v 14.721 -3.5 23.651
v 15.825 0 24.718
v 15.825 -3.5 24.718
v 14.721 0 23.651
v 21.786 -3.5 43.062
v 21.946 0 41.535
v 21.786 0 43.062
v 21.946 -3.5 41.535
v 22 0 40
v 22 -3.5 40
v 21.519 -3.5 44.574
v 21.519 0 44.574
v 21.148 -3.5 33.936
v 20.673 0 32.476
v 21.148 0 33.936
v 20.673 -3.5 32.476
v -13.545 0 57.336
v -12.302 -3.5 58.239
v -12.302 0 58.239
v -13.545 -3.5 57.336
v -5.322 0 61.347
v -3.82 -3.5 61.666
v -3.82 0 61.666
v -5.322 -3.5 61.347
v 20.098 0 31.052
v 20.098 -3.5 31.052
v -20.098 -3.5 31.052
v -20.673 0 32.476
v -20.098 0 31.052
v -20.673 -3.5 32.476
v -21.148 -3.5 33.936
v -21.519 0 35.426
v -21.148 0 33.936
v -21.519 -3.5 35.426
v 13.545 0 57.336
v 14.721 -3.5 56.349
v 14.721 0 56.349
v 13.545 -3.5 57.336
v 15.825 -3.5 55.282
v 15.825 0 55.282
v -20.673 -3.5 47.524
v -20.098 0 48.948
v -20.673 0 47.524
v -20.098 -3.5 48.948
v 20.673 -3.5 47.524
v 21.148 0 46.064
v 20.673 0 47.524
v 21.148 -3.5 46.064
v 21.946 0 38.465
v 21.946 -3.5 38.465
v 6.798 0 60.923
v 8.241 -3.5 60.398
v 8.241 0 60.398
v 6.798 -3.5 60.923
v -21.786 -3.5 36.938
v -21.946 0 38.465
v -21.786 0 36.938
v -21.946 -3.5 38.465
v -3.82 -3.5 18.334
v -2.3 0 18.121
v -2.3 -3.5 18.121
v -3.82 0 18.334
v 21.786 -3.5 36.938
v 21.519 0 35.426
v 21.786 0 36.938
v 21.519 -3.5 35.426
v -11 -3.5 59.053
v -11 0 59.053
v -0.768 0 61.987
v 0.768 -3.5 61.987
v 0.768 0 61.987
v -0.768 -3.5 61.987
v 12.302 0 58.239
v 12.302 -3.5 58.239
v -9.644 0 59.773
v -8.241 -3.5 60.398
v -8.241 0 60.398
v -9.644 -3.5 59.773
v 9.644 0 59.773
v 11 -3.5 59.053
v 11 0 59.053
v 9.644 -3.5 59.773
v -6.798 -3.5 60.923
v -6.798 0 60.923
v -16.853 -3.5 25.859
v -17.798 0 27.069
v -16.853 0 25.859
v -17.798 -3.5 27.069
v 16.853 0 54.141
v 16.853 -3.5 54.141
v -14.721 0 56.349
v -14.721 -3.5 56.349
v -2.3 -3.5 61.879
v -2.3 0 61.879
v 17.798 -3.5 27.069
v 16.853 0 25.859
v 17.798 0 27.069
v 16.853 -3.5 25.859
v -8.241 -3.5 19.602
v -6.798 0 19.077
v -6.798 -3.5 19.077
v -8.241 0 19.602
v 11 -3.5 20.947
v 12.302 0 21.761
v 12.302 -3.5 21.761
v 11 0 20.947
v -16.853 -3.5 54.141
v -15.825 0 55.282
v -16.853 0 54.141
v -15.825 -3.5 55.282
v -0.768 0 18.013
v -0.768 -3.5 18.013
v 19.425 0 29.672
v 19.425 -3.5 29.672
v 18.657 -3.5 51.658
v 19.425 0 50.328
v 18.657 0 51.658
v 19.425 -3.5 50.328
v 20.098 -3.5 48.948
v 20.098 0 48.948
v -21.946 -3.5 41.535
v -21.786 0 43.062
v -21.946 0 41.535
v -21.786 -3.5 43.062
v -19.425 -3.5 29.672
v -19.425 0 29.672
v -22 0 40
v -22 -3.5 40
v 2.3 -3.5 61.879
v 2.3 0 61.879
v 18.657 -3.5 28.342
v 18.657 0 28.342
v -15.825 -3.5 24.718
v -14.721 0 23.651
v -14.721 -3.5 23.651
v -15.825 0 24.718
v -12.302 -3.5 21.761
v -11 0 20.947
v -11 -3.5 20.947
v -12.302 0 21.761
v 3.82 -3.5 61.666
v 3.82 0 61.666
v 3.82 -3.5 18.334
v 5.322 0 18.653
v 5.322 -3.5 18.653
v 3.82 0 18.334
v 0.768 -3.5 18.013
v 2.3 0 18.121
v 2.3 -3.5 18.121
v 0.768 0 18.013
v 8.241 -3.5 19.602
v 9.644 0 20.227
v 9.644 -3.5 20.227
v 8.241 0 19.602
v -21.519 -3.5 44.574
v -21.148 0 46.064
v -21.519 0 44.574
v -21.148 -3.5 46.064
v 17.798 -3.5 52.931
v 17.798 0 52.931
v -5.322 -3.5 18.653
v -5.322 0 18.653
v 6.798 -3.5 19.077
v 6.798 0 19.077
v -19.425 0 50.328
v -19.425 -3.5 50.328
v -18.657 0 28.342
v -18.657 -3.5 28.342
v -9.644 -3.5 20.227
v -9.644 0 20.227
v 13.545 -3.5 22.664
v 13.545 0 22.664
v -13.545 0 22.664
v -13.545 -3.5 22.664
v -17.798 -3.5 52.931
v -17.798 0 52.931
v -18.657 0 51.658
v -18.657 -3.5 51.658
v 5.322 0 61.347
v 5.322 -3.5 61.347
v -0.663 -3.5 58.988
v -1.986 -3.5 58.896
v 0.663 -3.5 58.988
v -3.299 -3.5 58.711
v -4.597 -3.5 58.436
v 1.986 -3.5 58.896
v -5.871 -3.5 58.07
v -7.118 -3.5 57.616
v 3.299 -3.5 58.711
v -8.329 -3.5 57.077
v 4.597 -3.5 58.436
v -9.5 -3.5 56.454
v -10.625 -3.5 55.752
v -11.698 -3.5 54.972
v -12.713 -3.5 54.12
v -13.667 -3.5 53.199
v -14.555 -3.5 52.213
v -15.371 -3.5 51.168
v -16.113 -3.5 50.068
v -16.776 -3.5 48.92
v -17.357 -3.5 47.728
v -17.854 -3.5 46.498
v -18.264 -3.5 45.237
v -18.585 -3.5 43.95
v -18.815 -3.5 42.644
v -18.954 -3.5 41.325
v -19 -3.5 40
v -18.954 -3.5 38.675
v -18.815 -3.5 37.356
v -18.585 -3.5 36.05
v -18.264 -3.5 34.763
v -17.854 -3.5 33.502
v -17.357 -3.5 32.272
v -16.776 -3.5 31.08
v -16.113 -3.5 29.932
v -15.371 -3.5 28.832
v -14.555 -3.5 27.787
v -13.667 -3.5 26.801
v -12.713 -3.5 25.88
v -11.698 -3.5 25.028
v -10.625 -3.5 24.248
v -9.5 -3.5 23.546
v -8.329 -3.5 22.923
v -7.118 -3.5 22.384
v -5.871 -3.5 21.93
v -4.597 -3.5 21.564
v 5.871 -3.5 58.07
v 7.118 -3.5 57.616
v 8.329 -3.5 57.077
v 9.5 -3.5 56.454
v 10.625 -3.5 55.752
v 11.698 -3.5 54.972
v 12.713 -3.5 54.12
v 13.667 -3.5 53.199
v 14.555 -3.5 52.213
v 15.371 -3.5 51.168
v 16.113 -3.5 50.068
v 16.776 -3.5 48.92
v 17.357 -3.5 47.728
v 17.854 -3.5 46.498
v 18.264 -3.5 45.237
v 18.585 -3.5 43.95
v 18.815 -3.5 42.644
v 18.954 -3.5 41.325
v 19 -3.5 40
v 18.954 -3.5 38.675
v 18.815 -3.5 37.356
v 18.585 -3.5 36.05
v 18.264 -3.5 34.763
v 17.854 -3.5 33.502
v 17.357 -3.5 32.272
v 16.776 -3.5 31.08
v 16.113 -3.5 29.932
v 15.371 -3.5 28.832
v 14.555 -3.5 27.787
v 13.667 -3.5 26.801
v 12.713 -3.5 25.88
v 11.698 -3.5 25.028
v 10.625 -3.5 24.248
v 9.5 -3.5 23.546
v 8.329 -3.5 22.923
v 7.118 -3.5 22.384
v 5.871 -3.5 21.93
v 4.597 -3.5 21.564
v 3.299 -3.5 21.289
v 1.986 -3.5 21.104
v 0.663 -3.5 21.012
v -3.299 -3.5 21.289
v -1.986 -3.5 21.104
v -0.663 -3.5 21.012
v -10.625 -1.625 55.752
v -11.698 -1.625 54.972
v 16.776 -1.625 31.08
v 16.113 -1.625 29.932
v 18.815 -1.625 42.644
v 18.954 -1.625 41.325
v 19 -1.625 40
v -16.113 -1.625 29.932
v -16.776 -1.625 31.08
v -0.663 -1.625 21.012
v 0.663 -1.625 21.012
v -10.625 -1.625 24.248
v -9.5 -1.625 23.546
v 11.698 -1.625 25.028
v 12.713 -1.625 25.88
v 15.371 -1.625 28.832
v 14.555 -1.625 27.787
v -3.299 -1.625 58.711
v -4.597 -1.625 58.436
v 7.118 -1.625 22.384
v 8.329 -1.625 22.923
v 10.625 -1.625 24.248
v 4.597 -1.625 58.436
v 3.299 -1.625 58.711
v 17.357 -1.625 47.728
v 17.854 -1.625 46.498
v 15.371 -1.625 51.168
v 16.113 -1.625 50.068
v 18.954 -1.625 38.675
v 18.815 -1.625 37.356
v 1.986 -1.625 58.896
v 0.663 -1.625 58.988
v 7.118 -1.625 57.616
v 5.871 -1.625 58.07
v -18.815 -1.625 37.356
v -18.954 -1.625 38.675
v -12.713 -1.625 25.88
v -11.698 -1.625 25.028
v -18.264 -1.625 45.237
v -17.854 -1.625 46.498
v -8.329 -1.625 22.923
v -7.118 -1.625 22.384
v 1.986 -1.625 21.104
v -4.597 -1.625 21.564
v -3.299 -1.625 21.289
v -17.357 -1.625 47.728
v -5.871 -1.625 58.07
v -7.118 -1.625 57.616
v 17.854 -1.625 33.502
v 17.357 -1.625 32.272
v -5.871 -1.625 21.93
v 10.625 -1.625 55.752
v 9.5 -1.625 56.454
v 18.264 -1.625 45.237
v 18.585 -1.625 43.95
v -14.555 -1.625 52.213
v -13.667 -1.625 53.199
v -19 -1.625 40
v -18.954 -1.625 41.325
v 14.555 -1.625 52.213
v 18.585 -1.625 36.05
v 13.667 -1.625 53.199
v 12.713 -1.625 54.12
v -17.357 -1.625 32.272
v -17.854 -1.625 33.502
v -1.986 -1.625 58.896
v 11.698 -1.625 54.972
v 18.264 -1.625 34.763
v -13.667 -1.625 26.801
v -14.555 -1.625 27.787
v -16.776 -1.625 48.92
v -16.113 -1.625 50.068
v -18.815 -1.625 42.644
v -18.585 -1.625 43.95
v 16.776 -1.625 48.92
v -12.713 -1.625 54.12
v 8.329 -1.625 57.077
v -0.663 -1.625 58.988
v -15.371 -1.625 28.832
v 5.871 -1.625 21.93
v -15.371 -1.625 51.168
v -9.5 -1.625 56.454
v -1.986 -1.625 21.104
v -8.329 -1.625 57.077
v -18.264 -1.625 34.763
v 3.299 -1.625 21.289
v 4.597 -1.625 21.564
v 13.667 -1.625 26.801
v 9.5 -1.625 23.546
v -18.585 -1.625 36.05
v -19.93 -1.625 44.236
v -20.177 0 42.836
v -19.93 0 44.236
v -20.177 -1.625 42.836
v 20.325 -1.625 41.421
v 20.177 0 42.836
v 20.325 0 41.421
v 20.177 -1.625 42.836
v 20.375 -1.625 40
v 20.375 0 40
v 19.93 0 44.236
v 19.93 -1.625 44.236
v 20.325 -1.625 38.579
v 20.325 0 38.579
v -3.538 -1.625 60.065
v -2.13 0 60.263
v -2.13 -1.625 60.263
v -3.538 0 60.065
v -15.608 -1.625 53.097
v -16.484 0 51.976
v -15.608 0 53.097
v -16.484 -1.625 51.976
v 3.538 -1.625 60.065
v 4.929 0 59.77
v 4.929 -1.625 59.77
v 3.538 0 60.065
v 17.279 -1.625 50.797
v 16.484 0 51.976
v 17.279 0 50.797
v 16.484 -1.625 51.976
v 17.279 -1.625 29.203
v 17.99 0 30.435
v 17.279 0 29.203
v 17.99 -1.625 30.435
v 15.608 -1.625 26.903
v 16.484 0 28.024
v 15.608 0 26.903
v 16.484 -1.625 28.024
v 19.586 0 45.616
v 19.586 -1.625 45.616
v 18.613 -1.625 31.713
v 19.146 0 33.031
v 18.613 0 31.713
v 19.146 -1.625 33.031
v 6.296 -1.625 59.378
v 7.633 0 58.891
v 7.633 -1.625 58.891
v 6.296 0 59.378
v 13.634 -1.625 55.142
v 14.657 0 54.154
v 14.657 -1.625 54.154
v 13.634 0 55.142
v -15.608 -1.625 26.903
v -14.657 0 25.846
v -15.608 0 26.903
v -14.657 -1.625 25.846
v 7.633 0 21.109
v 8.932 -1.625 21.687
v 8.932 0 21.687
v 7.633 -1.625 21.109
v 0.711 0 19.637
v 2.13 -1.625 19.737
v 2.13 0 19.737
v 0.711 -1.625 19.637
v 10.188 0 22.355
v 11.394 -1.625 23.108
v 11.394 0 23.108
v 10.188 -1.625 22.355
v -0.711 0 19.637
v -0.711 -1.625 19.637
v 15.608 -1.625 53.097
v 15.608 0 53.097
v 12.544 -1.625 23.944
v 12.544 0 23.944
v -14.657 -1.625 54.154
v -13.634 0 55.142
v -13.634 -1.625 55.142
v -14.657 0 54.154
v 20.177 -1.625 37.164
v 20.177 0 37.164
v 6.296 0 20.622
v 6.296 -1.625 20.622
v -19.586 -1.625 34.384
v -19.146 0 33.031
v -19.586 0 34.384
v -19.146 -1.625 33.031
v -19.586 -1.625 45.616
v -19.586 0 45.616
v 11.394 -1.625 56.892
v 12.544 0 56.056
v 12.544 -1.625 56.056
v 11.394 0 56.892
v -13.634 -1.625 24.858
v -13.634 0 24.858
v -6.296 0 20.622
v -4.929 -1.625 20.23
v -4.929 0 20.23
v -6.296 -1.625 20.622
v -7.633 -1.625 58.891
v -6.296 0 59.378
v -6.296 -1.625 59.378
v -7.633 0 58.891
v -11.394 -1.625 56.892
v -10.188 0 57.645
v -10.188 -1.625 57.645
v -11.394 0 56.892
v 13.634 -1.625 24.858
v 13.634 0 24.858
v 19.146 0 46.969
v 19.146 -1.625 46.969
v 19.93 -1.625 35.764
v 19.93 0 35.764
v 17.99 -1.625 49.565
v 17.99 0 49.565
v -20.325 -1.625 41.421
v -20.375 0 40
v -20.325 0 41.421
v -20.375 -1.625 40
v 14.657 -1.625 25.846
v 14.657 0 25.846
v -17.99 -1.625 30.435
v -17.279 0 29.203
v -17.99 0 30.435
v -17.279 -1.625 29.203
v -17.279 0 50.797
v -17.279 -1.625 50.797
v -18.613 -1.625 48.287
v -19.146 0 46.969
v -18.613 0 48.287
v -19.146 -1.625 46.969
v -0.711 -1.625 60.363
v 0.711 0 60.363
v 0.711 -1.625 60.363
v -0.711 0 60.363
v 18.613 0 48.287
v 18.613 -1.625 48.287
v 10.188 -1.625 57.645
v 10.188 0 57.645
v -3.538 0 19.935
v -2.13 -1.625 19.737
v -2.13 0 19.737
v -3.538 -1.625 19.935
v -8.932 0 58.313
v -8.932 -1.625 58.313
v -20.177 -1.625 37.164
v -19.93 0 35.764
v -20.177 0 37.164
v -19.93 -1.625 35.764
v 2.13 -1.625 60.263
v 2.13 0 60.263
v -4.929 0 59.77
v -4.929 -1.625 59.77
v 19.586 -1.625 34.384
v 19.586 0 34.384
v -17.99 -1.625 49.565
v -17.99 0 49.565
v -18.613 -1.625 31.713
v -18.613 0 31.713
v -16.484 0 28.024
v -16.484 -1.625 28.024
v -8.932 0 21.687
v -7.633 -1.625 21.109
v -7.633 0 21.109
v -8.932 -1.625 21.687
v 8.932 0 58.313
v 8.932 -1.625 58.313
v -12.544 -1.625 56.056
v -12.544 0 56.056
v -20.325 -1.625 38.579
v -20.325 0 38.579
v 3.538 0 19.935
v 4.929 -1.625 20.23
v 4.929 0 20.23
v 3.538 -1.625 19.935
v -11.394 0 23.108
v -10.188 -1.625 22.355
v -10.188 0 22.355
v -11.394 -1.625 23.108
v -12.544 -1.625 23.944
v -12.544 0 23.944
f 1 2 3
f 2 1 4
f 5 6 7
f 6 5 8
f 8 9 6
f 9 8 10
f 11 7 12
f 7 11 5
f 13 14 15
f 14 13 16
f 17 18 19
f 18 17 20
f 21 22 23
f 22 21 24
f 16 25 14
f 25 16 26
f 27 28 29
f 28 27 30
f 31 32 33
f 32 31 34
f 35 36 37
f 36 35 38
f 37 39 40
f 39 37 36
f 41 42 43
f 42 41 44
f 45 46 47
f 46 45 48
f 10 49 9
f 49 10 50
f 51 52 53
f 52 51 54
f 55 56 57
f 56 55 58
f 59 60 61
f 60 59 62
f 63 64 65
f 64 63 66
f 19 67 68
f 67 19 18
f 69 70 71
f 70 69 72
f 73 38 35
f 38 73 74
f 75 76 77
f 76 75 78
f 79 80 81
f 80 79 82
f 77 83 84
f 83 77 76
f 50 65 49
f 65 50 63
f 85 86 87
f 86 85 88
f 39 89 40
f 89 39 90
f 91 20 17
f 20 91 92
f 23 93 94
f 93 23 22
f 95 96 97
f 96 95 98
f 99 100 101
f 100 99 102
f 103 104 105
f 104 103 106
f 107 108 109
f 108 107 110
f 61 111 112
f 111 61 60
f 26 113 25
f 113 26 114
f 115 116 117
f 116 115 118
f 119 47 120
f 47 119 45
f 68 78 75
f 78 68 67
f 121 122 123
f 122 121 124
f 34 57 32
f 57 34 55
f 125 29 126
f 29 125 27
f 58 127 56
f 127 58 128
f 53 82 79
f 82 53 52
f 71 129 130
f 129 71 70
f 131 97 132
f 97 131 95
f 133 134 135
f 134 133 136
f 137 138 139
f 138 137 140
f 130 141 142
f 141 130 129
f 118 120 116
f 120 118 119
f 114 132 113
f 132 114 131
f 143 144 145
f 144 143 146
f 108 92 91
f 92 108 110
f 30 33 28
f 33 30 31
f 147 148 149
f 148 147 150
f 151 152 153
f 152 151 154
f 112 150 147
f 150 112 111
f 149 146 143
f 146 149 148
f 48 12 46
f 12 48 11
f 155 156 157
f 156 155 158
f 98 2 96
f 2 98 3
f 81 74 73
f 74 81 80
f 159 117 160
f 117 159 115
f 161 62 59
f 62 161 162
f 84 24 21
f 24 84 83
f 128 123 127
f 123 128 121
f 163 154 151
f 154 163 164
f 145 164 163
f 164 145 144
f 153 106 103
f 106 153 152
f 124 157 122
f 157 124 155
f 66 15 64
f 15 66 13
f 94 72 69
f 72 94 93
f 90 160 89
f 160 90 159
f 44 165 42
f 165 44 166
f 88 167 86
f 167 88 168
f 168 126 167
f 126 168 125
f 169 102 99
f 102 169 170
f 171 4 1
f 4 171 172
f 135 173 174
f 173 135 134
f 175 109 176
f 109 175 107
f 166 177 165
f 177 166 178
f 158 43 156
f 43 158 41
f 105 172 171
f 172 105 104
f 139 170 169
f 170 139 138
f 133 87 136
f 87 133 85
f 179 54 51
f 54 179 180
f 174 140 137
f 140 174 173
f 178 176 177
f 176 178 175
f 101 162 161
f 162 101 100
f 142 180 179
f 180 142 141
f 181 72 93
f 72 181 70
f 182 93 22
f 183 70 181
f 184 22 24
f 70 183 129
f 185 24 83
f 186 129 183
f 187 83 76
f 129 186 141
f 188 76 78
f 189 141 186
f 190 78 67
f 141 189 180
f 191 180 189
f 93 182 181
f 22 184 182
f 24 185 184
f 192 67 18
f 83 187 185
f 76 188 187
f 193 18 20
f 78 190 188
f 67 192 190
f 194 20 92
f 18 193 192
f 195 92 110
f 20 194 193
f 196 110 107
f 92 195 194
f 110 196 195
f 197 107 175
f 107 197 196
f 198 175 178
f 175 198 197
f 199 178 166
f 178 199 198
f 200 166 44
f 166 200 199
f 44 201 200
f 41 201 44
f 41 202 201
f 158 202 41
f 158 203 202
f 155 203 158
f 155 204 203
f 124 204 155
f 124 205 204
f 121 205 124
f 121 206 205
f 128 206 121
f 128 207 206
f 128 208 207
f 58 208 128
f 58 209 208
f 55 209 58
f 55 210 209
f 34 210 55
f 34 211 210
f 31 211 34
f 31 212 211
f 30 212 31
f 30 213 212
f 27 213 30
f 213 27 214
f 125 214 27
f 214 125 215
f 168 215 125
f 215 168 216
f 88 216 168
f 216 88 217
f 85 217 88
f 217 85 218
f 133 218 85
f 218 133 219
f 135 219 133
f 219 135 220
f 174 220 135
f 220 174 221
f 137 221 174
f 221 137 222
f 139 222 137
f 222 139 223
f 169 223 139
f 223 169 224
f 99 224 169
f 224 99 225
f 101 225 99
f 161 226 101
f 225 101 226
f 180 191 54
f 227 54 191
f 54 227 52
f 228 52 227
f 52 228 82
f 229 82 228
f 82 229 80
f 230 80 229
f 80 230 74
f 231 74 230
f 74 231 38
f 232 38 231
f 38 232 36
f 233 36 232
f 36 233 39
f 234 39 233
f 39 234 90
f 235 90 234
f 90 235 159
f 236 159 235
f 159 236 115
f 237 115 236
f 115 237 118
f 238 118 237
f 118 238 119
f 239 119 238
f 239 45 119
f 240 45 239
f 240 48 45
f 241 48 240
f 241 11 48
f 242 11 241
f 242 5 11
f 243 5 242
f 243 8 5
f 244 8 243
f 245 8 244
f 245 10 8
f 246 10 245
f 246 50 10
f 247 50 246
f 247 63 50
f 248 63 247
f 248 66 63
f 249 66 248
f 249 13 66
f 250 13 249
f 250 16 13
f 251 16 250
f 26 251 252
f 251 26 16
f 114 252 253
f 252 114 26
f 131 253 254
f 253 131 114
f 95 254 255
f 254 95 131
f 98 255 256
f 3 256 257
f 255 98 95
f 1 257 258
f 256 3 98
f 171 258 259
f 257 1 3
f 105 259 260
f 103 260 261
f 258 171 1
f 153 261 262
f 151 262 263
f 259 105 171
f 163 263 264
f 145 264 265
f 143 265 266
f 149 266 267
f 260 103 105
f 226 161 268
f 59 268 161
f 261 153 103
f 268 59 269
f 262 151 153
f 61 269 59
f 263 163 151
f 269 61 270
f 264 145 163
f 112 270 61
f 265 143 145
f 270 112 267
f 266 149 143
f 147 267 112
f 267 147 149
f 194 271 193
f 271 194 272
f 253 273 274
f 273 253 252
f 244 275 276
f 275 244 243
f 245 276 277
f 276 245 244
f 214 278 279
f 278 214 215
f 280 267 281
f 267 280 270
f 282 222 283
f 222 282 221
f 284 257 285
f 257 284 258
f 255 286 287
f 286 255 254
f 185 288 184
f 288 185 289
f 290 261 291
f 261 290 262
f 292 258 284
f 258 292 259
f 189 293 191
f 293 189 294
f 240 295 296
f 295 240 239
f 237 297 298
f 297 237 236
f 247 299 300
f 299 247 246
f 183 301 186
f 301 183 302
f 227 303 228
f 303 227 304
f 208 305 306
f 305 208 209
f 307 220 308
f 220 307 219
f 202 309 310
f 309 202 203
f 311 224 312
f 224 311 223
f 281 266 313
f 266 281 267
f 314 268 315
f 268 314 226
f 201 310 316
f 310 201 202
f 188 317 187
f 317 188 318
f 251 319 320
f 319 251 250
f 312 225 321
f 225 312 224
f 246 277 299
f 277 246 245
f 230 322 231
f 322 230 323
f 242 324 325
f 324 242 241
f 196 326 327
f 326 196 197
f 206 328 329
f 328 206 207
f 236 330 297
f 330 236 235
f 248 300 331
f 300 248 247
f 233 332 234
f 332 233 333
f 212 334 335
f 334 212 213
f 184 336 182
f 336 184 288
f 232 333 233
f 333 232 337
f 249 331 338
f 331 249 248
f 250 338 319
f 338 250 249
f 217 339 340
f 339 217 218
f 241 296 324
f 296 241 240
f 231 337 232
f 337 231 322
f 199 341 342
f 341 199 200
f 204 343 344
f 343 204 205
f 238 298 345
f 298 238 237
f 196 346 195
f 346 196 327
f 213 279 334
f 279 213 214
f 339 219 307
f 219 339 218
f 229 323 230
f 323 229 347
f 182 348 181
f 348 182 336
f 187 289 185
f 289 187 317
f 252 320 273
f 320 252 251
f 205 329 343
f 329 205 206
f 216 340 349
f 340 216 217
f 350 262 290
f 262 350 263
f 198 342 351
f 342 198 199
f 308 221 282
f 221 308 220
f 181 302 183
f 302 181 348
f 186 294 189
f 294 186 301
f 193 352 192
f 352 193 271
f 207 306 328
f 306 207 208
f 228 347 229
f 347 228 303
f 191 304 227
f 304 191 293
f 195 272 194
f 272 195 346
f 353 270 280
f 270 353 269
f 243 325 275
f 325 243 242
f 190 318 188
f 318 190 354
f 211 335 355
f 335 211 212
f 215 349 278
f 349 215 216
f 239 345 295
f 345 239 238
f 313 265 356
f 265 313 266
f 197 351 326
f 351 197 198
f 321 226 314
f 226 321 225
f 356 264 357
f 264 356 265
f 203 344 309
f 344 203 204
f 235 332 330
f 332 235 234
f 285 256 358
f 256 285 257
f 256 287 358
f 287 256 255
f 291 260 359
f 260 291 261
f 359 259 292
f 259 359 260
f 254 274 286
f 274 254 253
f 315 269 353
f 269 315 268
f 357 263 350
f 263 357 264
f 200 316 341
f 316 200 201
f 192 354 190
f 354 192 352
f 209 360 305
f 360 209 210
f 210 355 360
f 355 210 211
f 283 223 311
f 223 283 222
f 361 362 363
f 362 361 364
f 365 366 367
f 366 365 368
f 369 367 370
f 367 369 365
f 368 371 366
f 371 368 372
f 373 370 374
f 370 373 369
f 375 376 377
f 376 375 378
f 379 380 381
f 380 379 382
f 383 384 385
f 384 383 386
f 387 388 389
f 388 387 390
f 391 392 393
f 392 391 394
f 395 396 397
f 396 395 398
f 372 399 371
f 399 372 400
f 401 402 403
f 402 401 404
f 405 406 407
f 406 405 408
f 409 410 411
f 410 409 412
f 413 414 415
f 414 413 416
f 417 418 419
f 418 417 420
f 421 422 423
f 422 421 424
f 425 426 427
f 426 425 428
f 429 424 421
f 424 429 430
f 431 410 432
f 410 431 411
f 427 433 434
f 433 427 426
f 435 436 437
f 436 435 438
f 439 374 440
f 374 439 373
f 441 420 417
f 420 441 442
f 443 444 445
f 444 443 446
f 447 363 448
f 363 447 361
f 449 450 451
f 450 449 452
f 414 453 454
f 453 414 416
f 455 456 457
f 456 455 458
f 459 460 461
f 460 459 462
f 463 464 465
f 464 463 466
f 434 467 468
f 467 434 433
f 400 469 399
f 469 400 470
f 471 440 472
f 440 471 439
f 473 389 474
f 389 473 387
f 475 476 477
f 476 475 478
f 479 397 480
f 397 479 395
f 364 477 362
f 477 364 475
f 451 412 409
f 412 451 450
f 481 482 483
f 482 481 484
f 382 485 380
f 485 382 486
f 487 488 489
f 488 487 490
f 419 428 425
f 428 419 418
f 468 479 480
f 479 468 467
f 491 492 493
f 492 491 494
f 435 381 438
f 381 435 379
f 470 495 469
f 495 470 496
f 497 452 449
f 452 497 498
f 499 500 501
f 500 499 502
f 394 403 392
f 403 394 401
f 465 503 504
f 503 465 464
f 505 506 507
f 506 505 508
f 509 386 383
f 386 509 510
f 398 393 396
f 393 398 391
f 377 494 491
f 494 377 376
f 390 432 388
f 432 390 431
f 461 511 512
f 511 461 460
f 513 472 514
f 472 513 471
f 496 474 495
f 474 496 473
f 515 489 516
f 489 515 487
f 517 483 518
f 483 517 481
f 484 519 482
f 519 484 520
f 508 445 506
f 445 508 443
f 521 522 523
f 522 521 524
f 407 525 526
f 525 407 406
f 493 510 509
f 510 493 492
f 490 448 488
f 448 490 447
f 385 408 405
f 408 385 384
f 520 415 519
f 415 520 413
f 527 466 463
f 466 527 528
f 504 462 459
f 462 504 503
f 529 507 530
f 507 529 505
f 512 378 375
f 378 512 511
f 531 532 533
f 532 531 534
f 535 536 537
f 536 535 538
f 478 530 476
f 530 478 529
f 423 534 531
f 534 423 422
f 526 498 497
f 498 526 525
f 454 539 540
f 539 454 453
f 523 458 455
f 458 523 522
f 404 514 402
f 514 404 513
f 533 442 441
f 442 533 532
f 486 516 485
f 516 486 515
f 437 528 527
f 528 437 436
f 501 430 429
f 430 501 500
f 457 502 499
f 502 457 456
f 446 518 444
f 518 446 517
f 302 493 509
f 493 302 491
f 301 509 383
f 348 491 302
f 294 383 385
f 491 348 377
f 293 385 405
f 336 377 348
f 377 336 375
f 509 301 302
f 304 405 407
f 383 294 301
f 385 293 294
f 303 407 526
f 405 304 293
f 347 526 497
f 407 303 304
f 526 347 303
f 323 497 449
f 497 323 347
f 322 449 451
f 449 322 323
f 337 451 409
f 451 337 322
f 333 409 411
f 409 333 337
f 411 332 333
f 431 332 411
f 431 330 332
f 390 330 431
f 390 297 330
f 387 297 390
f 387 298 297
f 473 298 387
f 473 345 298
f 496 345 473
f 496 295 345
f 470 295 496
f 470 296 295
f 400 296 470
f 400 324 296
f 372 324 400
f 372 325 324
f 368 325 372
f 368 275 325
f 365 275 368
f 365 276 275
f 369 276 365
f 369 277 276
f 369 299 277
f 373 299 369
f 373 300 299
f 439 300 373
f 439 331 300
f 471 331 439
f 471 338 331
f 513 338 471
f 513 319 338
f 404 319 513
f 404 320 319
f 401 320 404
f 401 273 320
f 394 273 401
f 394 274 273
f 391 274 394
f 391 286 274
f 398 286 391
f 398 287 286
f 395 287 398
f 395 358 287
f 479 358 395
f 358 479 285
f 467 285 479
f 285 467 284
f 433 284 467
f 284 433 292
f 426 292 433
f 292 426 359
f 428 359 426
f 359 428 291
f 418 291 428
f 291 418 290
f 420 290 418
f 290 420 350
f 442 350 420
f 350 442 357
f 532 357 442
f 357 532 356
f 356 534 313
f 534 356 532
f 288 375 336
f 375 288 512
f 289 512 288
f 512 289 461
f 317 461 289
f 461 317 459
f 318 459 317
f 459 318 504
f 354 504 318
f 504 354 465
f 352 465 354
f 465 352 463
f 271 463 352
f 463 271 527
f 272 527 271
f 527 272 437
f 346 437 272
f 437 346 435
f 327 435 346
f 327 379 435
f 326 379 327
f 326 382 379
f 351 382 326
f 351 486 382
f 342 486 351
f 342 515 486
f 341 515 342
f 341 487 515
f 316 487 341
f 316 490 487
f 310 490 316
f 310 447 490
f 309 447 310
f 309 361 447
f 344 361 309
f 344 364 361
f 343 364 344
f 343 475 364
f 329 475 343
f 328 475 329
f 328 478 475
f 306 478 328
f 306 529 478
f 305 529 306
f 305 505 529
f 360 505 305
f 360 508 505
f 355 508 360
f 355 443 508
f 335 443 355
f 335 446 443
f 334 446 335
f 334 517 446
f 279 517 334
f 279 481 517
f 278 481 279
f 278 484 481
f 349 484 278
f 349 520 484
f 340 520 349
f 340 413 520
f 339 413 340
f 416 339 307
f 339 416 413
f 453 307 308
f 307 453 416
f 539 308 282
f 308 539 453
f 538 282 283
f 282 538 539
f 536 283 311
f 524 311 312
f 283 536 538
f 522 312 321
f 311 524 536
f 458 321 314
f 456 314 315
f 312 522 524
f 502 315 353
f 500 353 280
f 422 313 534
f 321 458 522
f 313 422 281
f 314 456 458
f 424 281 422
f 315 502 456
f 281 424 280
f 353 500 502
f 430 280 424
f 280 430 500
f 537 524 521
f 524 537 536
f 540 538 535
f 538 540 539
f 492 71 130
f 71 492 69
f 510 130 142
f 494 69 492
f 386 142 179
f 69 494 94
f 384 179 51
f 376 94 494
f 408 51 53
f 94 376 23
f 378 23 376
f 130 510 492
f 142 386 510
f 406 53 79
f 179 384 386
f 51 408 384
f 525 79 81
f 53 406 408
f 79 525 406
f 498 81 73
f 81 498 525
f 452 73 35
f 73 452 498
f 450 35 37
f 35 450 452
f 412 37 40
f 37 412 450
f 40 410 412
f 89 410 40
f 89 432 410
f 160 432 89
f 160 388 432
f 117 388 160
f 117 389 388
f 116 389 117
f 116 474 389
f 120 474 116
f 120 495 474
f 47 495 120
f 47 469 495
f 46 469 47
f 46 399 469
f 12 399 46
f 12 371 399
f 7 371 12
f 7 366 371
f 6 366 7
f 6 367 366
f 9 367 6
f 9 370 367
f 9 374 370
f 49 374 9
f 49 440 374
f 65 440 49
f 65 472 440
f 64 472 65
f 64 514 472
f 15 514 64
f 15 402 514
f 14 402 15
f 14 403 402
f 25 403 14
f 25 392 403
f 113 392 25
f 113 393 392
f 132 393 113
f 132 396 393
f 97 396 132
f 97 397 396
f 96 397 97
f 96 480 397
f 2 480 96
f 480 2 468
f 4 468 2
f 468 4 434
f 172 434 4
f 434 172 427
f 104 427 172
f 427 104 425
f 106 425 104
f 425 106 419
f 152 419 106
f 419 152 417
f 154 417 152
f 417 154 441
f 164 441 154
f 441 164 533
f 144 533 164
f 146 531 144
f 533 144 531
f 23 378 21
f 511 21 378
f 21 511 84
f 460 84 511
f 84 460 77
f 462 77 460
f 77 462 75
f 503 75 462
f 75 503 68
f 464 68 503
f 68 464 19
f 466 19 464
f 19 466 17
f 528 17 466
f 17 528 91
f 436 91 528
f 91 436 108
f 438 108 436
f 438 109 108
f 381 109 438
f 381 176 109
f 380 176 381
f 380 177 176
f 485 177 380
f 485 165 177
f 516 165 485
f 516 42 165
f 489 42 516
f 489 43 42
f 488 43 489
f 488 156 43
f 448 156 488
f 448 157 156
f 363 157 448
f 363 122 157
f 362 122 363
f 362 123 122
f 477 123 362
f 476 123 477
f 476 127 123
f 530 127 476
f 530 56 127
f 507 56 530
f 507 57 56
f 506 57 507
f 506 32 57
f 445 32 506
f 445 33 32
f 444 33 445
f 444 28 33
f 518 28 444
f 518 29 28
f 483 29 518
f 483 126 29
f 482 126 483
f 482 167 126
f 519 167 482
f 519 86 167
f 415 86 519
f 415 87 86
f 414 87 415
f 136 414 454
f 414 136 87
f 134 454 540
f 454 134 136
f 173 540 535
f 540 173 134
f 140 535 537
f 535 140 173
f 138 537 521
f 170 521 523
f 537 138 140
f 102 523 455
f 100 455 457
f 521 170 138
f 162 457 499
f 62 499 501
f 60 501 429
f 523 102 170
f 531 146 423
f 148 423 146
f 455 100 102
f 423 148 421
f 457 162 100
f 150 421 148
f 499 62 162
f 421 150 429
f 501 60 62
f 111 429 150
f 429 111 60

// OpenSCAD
$fn=90;

module twall(){
    translate([0,15,0]) scale(.9) import("stl/t-wall.stl");
}

module emboss(image, imgscale=[1,1,1]){
    rotate([0,0,0]) scale(imgscale) surface(file=image, center=true, invert=true);
}

module ttext(txt,fontsize=8){
    font = "Courier:style=Bold Italic";
    height = 4.5;
    depth = 5;
    length = len(txt);
    for (a = [0:1:len(txt)]){
        translate([(a-length/2)*fontsize*.7,0,0]) rotate([90,0,0]) 
            linear_extrude(height=depth)
            text(txt[a],fontsize,font=font, halign="center");
    }
}

//emboss("iraq/isaf-2.png",[.5,.5,.5]); 

module ring(){
    dia = 40+4;
    thick = 3+4;
    difference()
    {
        cylinder(d=dia, h=thick, center=true);      // main ring
        cylinder(d=dia-6, h=thick*2, center=true);  // inner hole
        cylinder(d=dia-3.25, h=3+0.25, center=true);      // coin grove
        translate([0,0,-thick/2]) cube([2*dia, 2*dia,thick], center=true); // cut in half
    }
}

module coin(){
    dia = 40;
    thick = 3;
    color("gray", 0.5) cylinder(d=dia, h=thick, center=true);
}

module all(){
    translate([0,-1.5,0]) difference()
    {
        twall();
        translate([0,0,0]) ttext("Maj Walchko",6);
        translate([0,0,-15]) ttext("IJC/CJ2", 6);
        translate([0,0,-25]) ttext("NRO LNO",6);
        translate([0,0,-35]) ttext("OEF 2013");
        translate([0,25,-10]) rotate([90,0,180]) emboss("iraq/isaf-4.png",[.2,.2,.2]); 
        translate([0,0,40]) rotate([90,0,0]) cylinder(h=50,d=45,center=true);  // coin hole
    }
}

//color("green", 0.5) all();
//translate([0,0,40]) rotate([90,0,0]) coin();
translate([0,0,40]) rotate([90,0,0]) ring();
//translate([0,0,40]) rotate([-90,0,0]) ring();

//translate([0,0,30]) rotate([90,0,0]) cylinder(h=50,d=45,center=true);
